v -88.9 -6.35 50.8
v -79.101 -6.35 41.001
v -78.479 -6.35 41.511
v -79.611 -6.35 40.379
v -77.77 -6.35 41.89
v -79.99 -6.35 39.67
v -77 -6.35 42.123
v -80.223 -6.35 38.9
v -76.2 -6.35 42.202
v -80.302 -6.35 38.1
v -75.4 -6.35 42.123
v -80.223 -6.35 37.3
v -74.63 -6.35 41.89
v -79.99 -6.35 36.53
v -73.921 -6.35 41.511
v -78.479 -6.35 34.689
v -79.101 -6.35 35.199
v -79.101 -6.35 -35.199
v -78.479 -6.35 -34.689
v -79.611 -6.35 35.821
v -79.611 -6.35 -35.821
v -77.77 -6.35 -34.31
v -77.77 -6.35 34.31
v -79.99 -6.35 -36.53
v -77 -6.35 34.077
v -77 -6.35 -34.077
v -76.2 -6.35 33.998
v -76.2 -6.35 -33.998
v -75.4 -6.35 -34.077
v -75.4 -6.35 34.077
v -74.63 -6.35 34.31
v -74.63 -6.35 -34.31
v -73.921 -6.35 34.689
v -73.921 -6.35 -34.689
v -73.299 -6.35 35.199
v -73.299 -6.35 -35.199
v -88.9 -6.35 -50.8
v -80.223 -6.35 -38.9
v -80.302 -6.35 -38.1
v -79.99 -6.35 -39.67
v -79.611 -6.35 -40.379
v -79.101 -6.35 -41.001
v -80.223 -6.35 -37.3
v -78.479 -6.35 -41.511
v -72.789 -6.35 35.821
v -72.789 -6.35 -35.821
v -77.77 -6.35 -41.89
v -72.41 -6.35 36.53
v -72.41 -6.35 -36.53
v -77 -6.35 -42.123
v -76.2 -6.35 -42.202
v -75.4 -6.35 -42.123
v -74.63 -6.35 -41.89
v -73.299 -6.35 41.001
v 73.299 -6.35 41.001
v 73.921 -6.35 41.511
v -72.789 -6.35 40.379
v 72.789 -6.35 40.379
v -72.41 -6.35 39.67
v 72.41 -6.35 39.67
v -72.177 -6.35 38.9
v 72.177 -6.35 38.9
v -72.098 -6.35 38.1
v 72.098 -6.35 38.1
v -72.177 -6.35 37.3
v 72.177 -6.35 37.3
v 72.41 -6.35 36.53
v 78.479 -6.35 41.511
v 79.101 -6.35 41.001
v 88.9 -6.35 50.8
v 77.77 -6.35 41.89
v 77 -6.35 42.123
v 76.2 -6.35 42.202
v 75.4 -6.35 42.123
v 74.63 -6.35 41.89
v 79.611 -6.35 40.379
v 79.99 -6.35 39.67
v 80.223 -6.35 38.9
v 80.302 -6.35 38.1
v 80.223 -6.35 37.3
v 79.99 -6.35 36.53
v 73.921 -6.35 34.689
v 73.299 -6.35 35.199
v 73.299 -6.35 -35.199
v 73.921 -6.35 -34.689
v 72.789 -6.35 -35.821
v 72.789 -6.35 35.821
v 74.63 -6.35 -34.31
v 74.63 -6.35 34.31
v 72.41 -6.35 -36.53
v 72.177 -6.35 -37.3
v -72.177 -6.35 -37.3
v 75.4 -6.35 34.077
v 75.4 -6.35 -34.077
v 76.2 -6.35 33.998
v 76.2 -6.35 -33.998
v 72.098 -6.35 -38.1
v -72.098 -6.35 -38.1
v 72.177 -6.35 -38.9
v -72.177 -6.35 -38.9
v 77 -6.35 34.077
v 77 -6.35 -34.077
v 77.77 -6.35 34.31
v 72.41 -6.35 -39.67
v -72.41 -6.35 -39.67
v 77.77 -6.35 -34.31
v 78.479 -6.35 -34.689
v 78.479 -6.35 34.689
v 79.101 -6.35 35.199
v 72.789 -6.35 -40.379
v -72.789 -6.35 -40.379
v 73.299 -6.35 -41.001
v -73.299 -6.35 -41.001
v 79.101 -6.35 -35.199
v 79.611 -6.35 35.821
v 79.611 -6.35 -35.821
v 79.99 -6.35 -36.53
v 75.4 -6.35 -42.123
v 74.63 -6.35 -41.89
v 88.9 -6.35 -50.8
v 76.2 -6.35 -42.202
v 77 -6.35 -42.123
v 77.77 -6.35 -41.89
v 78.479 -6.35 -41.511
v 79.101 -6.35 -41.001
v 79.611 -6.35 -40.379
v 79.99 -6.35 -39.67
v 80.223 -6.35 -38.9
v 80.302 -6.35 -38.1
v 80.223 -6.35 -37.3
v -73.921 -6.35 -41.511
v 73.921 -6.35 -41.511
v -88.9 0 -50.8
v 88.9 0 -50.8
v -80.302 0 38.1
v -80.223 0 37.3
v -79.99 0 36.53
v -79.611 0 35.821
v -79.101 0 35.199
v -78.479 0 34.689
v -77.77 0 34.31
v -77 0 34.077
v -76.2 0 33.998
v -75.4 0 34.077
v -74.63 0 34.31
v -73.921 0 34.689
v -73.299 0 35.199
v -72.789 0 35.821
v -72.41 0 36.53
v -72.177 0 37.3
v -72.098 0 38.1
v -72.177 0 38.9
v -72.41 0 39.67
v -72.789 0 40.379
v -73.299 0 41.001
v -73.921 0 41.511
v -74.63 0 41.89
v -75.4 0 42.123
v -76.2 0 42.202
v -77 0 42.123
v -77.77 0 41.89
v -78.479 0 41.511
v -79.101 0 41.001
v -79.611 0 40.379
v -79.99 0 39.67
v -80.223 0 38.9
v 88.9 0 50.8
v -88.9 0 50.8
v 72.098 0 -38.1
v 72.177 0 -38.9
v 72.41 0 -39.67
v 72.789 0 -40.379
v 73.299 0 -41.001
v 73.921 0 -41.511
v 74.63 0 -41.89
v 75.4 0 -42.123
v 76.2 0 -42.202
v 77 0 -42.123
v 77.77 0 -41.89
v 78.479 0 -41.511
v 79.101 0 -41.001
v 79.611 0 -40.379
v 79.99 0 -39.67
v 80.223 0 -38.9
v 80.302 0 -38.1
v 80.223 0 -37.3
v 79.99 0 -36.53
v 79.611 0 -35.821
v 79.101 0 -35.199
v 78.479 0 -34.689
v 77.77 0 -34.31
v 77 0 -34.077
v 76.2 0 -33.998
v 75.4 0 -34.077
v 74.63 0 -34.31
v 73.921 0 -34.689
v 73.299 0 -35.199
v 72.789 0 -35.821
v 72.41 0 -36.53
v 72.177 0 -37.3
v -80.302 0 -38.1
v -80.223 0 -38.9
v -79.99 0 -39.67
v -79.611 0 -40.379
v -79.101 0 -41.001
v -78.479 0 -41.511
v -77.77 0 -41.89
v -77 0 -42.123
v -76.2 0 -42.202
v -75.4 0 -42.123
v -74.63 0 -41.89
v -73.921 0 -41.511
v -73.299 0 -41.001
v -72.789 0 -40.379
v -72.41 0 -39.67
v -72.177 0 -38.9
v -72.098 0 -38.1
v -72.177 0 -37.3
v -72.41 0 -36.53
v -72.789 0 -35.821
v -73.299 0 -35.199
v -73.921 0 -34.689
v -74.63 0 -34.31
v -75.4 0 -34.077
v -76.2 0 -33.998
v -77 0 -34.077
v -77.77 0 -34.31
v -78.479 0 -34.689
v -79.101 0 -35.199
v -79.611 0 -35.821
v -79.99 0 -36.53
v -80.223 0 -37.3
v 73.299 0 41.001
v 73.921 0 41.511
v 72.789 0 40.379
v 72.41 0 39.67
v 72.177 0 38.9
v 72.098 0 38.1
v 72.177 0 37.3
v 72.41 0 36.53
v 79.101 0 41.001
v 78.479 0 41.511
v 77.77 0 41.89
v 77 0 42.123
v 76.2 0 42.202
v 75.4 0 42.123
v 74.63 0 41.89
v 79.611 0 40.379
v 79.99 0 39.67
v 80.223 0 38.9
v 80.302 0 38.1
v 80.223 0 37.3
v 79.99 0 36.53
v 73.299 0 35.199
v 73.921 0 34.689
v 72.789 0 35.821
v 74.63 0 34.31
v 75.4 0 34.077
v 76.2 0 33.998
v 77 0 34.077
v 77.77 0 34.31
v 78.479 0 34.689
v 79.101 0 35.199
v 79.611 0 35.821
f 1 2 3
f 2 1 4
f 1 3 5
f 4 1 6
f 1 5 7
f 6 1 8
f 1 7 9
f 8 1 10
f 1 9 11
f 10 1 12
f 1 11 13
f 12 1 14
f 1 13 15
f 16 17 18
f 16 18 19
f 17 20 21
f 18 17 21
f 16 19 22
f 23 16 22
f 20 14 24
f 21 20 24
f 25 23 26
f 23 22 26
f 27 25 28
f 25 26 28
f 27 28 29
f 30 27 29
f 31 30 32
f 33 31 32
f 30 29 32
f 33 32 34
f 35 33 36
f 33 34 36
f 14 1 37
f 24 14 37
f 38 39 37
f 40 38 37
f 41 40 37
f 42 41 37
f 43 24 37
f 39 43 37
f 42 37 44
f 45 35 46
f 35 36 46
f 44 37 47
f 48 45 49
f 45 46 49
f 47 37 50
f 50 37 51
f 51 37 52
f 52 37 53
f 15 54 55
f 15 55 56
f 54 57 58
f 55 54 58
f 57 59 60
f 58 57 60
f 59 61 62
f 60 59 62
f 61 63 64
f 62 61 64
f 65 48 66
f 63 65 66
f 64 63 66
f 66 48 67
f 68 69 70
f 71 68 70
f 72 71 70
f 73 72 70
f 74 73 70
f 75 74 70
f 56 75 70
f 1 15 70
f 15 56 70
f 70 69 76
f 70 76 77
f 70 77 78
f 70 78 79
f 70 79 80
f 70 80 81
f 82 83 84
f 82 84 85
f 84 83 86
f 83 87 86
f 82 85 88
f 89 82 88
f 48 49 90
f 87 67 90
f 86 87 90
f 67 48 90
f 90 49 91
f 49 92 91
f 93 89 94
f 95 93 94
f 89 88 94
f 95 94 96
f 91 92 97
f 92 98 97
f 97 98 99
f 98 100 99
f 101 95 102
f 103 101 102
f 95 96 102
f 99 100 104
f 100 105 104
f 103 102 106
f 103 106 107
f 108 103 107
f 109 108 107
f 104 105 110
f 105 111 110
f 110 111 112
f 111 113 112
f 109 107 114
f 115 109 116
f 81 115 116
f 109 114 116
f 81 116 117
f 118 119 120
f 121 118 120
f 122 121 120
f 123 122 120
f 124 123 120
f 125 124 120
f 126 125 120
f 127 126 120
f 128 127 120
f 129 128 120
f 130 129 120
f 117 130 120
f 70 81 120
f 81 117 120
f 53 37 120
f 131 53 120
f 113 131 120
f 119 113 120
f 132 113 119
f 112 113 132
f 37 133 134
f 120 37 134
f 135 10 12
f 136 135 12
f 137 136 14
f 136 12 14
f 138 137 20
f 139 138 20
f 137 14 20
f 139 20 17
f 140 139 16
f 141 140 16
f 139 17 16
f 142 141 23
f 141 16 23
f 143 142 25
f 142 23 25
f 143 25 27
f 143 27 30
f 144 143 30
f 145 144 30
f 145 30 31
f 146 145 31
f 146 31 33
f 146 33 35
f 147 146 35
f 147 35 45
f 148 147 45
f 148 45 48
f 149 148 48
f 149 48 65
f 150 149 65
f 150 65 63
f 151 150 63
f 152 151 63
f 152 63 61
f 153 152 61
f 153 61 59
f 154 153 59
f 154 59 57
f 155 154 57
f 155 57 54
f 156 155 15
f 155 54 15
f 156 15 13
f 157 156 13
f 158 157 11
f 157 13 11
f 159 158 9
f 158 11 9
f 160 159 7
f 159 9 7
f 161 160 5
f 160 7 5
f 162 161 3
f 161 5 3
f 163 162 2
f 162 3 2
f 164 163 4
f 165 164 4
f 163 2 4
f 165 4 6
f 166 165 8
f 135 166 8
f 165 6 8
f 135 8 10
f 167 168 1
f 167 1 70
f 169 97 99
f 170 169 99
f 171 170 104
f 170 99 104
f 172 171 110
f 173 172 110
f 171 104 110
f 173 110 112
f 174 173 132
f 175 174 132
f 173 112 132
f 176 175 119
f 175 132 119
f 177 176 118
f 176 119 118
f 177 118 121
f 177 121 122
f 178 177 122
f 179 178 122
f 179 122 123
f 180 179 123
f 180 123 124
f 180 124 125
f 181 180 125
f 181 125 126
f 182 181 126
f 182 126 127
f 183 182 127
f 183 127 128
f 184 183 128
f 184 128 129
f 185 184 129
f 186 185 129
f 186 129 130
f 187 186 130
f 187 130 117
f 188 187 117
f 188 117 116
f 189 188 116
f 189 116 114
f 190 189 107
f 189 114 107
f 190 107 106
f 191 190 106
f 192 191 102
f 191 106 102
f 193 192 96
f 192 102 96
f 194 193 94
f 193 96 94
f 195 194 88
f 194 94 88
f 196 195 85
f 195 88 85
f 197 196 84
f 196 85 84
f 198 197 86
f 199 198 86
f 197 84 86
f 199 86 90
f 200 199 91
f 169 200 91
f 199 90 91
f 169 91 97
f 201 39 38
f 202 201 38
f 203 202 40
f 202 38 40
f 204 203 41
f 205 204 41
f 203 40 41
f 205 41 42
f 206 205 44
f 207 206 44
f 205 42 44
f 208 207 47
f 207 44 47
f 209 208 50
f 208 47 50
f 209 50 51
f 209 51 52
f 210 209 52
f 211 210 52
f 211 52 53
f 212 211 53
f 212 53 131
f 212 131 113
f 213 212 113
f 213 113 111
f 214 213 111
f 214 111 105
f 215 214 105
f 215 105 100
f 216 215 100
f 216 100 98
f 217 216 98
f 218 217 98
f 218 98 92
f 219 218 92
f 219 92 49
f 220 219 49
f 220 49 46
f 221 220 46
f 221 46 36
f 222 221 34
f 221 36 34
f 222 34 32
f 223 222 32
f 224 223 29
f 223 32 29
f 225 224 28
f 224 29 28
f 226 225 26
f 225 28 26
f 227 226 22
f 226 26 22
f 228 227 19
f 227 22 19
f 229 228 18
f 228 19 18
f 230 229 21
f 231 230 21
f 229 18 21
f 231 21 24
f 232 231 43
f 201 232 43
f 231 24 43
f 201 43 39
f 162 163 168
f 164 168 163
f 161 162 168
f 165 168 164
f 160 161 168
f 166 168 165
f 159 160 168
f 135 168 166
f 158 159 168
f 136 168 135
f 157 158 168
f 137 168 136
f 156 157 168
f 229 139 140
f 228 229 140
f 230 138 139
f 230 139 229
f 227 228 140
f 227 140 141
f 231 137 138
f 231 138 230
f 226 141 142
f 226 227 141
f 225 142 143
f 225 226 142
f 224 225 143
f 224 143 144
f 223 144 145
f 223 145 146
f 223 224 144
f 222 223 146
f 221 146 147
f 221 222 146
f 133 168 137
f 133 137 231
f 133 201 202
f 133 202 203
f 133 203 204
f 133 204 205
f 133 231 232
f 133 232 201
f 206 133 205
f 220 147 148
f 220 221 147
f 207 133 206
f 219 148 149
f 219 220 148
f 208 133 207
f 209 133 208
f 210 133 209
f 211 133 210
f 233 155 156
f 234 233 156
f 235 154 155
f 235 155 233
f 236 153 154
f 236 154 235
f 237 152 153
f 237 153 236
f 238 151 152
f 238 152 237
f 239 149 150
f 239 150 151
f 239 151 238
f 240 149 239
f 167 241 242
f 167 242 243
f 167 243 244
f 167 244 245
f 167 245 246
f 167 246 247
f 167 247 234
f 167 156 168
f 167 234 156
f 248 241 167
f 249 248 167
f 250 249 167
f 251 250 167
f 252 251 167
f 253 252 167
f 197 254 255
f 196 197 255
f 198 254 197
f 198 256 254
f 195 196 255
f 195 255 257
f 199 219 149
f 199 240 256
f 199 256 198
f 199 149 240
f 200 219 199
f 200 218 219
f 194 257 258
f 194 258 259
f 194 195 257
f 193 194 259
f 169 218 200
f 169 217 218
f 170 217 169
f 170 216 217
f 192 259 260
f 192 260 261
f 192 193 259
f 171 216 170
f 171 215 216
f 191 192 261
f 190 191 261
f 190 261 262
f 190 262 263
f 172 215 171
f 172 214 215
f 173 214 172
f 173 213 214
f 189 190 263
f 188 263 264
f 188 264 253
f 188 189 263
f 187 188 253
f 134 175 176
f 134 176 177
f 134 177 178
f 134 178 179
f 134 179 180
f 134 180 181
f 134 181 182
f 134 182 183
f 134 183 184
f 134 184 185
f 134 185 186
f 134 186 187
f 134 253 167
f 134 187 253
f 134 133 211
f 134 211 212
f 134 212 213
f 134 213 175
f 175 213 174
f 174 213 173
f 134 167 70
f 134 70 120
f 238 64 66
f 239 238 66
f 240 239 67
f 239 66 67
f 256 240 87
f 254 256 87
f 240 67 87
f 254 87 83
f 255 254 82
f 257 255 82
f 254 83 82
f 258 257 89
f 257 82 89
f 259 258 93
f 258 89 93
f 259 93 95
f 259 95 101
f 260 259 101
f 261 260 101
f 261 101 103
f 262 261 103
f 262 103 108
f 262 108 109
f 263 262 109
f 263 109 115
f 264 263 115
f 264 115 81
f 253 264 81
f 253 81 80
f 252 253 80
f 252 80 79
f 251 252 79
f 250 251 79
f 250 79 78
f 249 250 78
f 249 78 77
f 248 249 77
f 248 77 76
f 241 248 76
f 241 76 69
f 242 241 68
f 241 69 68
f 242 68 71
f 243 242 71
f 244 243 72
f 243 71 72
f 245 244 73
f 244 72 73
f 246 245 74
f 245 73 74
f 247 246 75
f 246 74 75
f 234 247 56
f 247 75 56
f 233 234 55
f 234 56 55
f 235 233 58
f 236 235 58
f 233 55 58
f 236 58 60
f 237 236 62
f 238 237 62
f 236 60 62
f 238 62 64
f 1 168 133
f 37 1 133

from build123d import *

# Parameters (mm, degrees)
SKETCH1_W                = 177.8
SKETCH1_H                = 101.6
BOSS_EXTRUDE1_DEPTH      = 6.35
P_0_323_DIAMETER_HOLE1_D = 8.2042


with BuildPart() as part:
    # Sketch1 → Boss-Extrude1 (new body)
    with BuildSketch(Plane(origin=(0, 0, 0), x_dir=(1, 0, 0), z_dir=(0, 1, 0))):
        Rectangle(SKETCH1_W, SKETCH1_H)
    extrude(amount=-BOSS_EXTRUDE1_DEPTH)

    # P (0.323) Diameter Hole1 (through all)
    with Locations(Plane(origin=(0, 0, 0), x_dir=(1, 0, 0), z_dir=(0, 1, 0))):
        with Locations((-76.2, 38.1), (-76.2, -38.1), (76.2, -38.1), (76.2, 38.1)):
            Hole(P_0_323_DIAMETER_HOLE1_D / 2)


solid = part.part
